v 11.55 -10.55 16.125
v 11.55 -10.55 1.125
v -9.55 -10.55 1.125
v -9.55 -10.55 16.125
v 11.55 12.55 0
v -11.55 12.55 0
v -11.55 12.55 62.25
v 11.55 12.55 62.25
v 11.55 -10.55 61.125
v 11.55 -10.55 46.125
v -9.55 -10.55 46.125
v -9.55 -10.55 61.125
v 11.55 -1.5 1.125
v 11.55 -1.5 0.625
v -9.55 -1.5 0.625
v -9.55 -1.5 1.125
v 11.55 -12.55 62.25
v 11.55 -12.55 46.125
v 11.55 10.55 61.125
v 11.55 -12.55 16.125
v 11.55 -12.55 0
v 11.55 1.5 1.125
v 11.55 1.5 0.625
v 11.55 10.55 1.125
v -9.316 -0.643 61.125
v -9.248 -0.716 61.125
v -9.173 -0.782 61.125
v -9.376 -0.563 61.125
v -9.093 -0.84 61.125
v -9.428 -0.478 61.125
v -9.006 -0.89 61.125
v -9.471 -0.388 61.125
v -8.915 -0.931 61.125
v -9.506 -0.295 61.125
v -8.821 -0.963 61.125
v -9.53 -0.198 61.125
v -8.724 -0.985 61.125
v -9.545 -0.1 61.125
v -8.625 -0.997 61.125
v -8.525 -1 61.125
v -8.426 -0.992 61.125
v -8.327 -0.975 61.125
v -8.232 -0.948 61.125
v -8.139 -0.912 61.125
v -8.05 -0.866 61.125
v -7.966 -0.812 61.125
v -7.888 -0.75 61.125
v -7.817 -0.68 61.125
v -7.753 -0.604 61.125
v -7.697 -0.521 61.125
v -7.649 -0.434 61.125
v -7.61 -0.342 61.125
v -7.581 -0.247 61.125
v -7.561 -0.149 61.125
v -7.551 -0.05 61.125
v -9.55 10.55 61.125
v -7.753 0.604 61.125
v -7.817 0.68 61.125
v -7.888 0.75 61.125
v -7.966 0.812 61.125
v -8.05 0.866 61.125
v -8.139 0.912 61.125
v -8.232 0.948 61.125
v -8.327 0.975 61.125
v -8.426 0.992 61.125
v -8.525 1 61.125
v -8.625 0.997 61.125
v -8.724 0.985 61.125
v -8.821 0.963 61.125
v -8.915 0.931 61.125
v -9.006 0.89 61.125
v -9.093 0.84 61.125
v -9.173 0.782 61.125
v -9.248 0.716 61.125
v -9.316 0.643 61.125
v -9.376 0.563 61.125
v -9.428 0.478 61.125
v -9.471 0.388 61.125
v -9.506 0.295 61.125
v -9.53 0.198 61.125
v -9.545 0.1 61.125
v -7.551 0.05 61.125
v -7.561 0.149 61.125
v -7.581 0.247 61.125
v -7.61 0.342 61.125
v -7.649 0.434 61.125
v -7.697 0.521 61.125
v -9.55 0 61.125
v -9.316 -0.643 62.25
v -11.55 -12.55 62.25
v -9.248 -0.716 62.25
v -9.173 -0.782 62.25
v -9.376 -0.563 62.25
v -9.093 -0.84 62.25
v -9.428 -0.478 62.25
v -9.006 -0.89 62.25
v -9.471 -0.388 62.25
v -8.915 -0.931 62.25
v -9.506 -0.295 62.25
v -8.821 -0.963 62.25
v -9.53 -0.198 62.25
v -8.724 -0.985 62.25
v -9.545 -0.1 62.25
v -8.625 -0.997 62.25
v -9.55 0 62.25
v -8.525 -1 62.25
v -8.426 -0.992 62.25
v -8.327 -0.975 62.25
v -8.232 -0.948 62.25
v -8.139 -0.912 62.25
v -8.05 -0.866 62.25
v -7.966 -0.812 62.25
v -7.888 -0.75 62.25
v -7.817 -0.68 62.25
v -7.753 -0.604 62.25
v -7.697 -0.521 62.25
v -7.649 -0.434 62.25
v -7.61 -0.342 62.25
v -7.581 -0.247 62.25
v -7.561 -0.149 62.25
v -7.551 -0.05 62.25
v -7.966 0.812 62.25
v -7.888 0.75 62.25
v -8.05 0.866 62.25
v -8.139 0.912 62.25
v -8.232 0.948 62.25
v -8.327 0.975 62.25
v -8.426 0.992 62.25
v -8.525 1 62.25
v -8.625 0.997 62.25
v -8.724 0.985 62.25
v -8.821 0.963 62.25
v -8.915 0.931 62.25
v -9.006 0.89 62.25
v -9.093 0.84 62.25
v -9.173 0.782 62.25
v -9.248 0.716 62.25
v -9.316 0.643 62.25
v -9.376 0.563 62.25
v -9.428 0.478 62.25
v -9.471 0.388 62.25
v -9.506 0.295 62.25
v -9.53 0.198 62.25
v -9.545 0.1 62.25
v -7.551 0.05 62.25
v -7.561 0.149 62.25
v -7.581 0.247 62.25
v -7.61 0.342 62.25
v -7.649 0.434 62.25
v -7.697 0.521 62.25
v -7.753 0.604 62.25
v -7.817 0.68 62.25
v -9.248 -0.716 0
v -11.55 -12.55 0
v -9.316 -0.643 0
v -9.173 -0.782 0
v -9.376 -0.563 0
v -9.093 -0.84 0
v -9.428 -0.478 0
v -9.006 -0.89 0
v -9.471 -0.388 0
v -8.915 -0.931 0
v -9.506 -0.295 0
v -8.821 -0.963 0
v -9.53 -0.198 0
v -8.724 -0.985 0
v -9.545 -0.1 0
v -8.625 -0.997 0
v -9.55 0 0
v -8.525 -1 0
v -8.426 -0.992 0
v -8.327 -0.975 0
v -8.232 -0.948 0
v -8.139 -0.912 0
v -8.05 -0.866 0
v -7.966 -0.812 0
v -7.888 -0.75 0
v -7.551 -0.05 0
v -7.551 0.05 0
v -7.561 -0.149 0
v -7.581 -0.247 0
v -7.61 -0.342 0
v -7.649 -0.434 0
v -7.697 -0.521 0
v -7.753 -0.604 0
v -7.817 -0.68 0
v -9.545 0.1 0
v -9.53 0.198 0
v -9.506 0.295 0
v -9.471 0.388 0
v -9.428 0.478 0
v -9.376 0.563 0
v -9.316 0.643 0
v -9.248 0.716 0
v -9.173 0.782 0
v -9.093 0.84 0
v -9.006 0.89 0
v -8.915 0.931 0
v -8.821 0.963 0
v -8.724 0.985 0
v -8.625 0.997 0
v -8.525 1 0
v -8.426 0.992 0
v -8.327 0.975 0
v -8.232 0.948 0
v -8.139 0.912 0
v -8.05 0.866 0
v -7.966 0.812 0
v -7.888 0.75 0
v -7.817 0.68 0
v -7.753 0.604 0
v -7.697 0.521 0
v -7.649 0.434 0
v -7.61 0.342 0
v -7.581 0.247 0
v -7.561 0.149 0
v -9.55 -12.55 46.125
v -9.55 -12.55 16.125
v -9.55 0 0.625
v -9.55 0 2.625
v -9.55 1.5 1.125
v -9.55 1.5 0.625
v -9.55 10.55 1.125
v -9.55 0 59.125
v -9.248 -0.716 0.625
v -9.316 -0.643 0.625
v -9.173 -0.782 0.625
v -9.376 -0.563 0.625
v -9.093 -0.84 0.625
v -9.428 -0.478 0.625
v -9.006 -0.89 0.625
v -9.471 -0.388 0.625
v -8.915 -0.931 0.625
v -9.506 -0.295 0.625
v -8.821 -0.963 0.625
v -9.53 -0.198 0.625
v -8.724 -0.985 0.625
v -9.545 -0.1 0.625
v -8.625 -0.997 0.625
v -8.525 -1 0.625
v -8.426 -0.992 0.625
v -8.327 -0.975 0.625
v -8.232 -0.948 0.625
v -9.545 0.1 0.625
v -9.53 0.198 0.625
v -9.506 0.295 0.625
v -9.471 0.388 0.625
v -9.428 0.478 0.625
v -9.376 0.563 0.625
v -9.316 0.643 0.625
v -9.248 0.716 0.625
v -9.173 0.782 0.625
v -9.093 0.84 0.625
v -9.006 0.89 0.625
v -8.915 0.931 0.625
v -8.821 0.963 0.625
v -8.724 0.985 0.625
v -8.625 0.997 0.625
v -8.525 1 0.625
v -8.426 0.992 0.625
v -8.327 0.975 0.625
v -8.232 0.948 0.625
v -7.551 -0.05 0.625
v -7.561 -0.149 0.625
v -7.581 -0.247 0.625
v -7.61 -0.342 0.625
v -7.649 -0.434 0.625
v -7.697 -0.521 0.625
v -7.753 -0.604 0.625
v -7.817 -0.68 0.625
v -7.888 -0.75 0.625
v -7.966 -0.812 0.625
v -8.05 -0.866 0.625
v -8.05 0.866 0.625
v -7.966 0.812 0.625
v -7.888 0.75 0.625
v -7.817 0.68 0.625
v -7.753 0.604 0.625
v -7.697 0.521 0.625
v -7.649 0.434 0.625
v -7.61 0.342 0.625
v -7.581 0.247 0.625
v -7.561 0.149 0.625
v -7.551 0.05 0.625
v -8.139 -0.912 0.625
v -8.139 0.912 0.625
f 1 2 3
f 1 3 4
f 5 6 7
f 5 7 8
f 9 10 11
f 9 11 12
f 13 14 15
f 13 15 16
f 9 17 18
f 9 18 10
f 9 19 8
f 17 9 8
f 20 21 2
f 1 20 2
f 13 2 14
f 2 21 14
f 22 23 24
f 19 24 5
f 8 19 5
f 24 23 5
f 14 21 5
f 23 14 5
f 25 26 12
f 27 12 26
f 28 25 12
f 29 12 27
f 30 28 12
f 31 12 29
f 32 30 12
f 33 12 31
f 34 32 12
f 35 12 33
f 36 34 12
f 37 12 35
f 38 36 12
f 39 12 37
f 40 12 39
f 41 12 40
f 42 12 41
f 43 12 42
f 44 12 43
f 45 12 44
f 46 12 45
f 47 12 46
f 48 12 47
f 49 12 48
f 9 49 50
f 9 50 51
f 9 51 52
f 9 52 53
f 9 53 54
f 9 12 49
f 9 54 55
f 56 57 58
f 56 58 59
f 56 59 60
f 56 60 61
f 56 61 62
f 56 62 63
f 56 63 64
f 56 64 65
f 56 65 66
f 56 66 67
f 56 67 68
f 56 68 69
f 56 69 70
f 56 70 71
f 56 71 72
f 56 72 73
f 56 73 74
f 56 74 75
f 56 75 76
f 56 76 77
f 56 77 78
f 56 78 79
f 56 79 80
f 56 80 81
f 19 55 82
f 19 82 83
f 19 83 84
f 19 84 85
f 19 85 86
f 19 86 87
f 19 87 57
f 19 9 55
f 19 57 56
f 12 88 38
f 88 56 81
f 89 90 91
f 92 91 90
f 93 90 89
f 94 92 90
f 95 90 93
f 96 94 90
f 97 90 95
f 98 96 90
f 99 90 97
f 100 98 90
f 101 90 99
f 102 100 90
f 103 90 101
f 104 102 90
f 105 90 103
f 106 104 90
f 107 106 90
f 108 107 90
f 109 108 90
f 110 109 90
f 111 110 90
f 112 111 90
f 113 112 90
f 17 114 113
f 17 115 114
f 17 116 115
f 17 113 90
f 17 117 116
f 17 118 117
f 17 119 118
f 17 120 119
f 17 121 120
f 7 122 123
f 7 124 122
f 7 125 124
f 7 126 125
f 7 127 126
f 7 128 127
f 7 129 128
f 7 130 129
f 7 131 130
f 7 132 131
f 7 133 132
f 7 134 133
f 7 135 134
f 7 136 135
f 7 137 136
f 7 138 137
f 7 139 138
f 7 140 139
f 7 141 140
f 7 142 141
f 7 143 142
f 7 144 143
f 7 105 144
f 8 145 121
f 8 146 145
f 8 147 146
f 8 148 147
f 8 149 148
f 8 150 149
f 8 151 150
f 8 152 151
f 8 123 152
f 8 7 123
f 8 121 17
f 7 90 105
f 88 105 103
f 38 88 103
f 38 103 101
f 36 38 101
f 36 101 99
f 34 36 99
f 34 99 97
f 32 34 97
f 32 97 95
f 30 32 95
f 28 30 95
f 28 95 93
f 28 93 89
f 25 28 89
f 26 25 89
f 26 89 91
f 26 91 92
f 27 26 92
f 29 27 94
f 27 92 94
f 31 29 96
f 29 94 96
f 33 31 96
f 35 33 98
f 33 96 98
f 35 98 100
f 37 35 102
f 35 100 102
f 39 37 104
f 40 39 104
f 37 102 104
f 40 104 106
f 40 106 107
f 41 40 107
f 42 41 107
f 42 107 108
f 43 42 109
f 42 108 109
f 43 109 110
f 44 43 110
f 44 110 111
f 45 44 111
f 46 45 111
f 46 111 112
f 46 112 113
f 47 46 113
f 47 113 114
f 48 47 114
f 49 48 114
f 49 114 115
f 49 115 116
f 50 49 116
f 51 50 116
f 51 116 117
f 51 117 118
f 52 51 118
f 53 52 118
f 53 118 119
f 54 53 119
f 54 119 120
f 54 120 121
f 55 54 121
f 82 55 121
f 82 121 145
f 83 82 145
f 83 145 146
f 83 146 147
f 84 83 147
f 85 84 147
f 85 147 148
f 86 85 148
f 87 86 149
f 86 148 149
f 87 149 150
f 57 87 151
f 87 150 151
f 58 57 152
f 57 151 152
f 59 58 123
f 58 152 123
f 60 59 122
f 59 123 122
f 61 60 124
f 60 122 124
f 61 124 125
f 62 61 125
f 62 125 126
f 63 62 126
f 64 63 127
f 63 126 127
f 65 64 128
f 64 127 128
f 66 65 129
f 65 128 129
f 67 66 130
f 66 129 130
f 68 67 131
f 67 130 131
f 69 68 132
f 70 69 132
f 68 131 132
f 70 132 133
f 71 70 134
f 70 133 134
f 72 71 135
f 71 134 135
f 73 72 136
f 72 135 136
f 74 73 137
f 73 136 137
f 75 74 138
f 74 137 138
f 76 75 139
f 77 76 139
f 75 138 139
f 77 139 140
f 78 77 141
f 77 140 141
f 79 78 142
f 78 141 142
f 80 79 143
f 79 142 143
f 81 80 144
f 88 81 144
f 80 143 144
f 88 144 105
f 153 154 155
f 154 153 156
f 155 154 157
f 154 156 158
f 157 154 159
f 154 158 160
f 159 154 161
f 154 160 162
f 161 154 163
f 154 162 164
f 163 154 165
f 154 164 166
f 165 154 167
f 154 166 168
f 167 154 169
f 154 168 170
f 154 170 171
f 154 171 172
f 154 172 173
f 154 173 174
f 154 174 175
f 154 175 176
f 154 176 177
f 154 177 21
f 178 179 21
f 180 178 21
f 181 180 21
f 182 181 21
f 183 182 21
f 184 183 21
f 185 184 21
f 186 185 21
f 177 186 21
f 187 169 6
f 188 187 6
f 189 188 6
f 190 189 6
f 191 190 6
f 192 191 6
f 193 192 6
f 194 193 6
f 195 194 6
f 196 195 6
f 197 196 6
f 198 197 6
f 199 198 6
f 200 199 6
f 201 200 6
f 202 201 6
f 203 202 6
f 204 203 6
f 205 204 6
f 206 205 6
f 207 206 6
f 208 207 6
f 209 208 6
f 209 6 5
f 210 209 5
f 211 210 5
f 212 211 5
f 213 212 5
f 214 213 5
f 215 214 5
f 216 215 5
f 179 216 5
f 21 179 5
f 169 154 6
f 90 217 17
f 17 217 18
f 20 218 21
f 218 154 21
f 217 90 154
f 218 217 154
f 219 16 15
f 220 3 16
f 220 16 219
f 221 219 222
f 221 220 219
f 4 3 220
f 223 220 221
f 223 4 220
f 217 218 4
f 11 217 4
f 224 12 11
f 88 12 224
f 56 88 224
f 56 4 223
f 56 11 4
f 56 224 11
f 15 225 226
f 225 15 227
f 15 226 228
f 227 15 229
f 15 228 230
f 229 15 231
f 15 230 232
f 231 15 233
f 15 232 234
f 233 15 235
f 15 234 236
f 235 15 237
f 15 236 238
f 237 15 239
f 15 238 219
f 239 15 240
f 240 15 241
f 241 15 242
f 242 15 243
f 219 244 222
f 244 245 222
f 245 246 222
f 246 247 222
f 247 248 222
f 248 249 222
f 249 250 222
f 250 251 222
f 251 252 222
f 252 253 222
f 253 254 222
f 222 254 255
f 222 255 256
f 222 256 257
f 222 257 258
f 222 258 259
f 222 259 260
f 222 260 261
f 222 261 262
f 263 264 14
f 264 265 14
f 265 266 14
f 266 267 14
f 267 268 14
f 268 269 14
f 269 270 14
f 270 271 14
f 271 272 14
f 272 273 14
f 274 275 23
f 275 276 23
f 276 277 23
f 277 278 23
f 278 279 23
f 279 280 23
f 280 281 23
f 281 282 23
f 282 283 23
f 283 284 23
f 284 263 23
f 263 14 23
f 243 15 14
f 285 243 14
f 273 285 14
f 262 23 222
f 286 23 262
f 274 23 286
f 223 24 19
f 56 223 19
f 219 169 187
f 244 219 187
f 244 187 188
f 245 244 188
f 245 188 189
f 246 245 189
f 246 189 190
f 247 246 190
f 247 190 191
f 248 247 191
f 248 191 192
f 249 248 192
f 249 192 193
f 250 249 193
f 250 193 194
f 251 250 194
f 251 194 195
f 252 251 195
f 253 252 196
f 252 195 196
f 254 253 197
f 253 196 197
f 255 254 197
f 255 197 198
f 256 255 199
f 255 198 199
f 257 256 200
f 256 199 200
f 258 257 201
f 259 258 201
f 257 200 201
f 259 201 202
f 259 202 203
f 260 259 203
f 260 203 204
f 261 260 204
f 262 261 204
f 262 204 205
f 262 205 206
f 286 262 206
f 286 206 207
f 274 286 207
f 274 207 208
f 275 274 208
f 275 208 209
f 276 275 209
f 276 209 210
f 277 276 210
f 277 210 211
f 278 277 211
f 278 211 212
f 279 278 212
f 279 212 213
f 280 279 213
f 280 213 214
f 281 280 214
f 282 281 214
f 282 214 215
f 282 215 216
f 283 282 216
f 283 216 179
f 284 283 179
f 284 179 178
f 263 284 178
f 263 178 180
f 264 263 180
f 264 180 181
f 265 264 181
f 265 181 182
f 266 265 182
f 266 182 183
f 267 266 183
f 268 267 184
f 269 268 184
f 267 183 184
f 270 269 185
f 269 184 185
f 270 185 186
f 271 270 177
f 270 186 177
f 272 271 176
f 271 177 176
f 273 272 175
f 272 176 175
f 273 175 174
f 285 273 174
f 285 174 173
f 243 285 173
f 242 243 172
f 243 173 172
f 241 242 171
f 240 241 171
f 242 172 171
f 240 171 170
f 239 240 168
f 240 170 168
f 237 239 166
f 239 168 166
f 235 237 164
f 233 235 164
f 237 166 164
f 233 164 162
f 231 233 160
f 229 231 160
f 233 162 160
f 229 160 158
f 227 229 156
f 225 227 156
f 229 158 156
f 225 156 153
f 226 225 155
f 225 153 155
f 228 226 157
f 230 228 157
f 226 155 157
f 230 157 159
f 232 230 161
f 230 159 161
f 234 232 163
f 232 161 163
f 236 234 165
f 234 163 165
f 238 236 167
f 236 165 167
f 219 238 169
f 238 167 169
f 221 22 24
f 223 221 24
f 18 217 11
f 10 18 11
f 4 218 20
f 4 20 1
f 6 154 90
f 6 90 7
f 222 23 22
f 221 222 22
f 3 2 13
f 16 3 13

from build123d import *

# Parameters (mm, degrees)
F0_W      = 23.1
F0_H      = 25.1
F1_DEPTH  = 62.25
F2_W      = 21.1
F2_H      = 60
F3_DEPTH  = 21.1
F4_W      = 3
F4_H      = 1
F5_DEPTH  = 21.1
F6_W      = 4
F6_H      = 30
F7_DEPTH  = 21.1
F9_D      = 2
F9_DEPTH  = 2
F11_D     = 2
F11_DEPTH = 2


with BuildPart() as f1:
    # F0 (on Top) → F1 (new body)
    with BuildSketch(Plane.XY):
        Rectangle(F0_W, F0_H)
    extrude(amount=F1_DEPTH)

    # F2 (on face) → F3 (cut)
    with BuildSketch(Plane.YZ.offset(11.55)):
        with Locations((0, 31.125)):
            Rectangle(F2_W, F2_H)
    extrude(amount=-F3_DEPTH, mode=Mode.SUBTRACT)

    # F4 (on face) → F5 (cut)
    with BuildSketch(Plane.YZ.offset(11.55)):
        with Locations((0, 1.125)):
            Rectangle(F4_W, F4_H)
    extrude(amount=-F5_DEPTH, mode=Mode.SUBTRACT)

    # F6 (on face) → F7 (cut)
    with BuildSketch(Plane.YZ.offset(11.55)):
        with Locations((-12.55, 31.125)):
            Rectangle(F6_W, F6_H)
    extrude(amount=-F7_DEPTH, mode=Mode.SUBTRACT)

    # F9
    with Locations(Plane(origin=(0, 0, 61.125), x_dir=(1, 0, 0), z_dir=(0, 0, -1))):
        with Locations((-8.55, 0)):
            Hole(F9_D / 2, depth=F9_DEPTH)

    # F11
    with Locations(Plane.XY.offset(0.625)):
        with Locations((-8.55, 0)):
            Hole(F11_D / 2, depth=F11_DEPTH)


solid = f1.part
